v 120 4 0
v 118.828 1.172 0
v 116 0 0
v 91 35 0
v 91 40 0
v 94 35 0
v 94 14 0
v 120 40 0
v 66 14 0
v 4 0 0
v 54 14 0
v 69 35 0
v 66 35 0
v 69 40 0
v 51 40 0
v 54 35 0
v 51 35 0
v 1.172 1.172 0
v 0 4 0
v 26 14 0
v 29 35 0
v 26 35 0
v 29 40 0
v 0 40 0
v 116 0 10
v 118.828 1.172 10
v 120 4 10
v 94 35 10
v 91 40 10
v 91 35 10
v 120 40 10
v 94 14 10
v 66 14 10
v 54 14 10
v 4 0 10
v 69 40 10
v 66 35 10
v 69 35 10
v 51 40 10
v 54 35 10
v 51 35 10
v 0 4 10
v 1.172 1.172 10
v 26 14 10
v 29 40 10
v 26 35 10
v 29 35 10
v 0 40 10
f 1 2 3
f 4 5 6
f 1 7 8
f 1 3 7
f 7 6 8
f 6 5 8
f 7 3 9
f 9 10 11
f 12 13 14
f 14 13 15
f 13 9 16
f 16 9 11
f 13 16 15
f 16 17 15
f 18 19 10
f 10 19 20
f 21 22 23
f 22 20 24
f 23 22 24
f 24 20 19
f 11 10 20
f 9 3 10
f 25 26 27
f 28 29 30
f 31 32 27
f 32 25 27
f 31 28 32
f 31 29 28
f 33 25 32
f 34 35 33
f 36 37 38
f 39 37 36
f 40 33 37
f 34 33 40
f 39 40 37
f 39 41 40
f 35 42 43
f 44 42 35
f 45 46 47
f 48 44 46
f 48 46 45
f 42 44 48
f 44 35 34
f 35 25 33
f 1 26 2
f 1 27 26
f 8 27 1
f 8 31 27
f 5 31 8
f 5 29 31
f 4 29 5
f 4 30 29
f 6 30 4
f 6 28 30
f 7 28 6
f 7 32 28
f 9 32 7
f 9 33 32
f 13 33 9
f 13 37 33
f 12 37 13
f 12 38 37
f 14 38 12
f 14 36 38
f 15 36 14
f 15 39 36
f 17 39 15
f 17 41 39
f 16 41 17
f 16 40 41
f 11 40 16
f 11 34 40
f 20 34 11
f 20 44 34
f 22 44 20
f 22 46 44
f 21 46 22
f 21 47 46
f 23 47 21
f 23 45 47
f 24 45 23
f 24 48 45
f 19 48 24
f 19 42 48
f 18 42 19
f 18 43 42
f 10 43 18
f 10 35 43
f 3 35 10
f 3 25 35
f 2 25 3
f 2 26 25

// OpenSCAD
$fn = 32;

// ----------------------------------------------------------------------
// Oversize slot bar: 120 mm bar with 2 oversize windows
// ----------------------------------------------------------------------

// --- parameters (mm) ---
profile_height = 10;      // extrusion height
profile_points = 24;      // points of the closed outline

profile = [[0, 4], [1.172, 1.172], [4, 0], [116, 0], [118.828, 1.172], [120, 4], [120, 40], [91, 40], [91, 35], [94, 35], [94, 14], [66, 14], [66, 35], [69, 35], [69, 40], [51, 40], [51, 35], [54, 35], [54, 14], [26, 14], [26, 35], [29, 35], [29, 40], [0, 40]];  // single closed polygon, 24 points, counter clockwise

// --- the one profile operation ---
linear_extrude(height = profile_height) polygon(points = profile);
